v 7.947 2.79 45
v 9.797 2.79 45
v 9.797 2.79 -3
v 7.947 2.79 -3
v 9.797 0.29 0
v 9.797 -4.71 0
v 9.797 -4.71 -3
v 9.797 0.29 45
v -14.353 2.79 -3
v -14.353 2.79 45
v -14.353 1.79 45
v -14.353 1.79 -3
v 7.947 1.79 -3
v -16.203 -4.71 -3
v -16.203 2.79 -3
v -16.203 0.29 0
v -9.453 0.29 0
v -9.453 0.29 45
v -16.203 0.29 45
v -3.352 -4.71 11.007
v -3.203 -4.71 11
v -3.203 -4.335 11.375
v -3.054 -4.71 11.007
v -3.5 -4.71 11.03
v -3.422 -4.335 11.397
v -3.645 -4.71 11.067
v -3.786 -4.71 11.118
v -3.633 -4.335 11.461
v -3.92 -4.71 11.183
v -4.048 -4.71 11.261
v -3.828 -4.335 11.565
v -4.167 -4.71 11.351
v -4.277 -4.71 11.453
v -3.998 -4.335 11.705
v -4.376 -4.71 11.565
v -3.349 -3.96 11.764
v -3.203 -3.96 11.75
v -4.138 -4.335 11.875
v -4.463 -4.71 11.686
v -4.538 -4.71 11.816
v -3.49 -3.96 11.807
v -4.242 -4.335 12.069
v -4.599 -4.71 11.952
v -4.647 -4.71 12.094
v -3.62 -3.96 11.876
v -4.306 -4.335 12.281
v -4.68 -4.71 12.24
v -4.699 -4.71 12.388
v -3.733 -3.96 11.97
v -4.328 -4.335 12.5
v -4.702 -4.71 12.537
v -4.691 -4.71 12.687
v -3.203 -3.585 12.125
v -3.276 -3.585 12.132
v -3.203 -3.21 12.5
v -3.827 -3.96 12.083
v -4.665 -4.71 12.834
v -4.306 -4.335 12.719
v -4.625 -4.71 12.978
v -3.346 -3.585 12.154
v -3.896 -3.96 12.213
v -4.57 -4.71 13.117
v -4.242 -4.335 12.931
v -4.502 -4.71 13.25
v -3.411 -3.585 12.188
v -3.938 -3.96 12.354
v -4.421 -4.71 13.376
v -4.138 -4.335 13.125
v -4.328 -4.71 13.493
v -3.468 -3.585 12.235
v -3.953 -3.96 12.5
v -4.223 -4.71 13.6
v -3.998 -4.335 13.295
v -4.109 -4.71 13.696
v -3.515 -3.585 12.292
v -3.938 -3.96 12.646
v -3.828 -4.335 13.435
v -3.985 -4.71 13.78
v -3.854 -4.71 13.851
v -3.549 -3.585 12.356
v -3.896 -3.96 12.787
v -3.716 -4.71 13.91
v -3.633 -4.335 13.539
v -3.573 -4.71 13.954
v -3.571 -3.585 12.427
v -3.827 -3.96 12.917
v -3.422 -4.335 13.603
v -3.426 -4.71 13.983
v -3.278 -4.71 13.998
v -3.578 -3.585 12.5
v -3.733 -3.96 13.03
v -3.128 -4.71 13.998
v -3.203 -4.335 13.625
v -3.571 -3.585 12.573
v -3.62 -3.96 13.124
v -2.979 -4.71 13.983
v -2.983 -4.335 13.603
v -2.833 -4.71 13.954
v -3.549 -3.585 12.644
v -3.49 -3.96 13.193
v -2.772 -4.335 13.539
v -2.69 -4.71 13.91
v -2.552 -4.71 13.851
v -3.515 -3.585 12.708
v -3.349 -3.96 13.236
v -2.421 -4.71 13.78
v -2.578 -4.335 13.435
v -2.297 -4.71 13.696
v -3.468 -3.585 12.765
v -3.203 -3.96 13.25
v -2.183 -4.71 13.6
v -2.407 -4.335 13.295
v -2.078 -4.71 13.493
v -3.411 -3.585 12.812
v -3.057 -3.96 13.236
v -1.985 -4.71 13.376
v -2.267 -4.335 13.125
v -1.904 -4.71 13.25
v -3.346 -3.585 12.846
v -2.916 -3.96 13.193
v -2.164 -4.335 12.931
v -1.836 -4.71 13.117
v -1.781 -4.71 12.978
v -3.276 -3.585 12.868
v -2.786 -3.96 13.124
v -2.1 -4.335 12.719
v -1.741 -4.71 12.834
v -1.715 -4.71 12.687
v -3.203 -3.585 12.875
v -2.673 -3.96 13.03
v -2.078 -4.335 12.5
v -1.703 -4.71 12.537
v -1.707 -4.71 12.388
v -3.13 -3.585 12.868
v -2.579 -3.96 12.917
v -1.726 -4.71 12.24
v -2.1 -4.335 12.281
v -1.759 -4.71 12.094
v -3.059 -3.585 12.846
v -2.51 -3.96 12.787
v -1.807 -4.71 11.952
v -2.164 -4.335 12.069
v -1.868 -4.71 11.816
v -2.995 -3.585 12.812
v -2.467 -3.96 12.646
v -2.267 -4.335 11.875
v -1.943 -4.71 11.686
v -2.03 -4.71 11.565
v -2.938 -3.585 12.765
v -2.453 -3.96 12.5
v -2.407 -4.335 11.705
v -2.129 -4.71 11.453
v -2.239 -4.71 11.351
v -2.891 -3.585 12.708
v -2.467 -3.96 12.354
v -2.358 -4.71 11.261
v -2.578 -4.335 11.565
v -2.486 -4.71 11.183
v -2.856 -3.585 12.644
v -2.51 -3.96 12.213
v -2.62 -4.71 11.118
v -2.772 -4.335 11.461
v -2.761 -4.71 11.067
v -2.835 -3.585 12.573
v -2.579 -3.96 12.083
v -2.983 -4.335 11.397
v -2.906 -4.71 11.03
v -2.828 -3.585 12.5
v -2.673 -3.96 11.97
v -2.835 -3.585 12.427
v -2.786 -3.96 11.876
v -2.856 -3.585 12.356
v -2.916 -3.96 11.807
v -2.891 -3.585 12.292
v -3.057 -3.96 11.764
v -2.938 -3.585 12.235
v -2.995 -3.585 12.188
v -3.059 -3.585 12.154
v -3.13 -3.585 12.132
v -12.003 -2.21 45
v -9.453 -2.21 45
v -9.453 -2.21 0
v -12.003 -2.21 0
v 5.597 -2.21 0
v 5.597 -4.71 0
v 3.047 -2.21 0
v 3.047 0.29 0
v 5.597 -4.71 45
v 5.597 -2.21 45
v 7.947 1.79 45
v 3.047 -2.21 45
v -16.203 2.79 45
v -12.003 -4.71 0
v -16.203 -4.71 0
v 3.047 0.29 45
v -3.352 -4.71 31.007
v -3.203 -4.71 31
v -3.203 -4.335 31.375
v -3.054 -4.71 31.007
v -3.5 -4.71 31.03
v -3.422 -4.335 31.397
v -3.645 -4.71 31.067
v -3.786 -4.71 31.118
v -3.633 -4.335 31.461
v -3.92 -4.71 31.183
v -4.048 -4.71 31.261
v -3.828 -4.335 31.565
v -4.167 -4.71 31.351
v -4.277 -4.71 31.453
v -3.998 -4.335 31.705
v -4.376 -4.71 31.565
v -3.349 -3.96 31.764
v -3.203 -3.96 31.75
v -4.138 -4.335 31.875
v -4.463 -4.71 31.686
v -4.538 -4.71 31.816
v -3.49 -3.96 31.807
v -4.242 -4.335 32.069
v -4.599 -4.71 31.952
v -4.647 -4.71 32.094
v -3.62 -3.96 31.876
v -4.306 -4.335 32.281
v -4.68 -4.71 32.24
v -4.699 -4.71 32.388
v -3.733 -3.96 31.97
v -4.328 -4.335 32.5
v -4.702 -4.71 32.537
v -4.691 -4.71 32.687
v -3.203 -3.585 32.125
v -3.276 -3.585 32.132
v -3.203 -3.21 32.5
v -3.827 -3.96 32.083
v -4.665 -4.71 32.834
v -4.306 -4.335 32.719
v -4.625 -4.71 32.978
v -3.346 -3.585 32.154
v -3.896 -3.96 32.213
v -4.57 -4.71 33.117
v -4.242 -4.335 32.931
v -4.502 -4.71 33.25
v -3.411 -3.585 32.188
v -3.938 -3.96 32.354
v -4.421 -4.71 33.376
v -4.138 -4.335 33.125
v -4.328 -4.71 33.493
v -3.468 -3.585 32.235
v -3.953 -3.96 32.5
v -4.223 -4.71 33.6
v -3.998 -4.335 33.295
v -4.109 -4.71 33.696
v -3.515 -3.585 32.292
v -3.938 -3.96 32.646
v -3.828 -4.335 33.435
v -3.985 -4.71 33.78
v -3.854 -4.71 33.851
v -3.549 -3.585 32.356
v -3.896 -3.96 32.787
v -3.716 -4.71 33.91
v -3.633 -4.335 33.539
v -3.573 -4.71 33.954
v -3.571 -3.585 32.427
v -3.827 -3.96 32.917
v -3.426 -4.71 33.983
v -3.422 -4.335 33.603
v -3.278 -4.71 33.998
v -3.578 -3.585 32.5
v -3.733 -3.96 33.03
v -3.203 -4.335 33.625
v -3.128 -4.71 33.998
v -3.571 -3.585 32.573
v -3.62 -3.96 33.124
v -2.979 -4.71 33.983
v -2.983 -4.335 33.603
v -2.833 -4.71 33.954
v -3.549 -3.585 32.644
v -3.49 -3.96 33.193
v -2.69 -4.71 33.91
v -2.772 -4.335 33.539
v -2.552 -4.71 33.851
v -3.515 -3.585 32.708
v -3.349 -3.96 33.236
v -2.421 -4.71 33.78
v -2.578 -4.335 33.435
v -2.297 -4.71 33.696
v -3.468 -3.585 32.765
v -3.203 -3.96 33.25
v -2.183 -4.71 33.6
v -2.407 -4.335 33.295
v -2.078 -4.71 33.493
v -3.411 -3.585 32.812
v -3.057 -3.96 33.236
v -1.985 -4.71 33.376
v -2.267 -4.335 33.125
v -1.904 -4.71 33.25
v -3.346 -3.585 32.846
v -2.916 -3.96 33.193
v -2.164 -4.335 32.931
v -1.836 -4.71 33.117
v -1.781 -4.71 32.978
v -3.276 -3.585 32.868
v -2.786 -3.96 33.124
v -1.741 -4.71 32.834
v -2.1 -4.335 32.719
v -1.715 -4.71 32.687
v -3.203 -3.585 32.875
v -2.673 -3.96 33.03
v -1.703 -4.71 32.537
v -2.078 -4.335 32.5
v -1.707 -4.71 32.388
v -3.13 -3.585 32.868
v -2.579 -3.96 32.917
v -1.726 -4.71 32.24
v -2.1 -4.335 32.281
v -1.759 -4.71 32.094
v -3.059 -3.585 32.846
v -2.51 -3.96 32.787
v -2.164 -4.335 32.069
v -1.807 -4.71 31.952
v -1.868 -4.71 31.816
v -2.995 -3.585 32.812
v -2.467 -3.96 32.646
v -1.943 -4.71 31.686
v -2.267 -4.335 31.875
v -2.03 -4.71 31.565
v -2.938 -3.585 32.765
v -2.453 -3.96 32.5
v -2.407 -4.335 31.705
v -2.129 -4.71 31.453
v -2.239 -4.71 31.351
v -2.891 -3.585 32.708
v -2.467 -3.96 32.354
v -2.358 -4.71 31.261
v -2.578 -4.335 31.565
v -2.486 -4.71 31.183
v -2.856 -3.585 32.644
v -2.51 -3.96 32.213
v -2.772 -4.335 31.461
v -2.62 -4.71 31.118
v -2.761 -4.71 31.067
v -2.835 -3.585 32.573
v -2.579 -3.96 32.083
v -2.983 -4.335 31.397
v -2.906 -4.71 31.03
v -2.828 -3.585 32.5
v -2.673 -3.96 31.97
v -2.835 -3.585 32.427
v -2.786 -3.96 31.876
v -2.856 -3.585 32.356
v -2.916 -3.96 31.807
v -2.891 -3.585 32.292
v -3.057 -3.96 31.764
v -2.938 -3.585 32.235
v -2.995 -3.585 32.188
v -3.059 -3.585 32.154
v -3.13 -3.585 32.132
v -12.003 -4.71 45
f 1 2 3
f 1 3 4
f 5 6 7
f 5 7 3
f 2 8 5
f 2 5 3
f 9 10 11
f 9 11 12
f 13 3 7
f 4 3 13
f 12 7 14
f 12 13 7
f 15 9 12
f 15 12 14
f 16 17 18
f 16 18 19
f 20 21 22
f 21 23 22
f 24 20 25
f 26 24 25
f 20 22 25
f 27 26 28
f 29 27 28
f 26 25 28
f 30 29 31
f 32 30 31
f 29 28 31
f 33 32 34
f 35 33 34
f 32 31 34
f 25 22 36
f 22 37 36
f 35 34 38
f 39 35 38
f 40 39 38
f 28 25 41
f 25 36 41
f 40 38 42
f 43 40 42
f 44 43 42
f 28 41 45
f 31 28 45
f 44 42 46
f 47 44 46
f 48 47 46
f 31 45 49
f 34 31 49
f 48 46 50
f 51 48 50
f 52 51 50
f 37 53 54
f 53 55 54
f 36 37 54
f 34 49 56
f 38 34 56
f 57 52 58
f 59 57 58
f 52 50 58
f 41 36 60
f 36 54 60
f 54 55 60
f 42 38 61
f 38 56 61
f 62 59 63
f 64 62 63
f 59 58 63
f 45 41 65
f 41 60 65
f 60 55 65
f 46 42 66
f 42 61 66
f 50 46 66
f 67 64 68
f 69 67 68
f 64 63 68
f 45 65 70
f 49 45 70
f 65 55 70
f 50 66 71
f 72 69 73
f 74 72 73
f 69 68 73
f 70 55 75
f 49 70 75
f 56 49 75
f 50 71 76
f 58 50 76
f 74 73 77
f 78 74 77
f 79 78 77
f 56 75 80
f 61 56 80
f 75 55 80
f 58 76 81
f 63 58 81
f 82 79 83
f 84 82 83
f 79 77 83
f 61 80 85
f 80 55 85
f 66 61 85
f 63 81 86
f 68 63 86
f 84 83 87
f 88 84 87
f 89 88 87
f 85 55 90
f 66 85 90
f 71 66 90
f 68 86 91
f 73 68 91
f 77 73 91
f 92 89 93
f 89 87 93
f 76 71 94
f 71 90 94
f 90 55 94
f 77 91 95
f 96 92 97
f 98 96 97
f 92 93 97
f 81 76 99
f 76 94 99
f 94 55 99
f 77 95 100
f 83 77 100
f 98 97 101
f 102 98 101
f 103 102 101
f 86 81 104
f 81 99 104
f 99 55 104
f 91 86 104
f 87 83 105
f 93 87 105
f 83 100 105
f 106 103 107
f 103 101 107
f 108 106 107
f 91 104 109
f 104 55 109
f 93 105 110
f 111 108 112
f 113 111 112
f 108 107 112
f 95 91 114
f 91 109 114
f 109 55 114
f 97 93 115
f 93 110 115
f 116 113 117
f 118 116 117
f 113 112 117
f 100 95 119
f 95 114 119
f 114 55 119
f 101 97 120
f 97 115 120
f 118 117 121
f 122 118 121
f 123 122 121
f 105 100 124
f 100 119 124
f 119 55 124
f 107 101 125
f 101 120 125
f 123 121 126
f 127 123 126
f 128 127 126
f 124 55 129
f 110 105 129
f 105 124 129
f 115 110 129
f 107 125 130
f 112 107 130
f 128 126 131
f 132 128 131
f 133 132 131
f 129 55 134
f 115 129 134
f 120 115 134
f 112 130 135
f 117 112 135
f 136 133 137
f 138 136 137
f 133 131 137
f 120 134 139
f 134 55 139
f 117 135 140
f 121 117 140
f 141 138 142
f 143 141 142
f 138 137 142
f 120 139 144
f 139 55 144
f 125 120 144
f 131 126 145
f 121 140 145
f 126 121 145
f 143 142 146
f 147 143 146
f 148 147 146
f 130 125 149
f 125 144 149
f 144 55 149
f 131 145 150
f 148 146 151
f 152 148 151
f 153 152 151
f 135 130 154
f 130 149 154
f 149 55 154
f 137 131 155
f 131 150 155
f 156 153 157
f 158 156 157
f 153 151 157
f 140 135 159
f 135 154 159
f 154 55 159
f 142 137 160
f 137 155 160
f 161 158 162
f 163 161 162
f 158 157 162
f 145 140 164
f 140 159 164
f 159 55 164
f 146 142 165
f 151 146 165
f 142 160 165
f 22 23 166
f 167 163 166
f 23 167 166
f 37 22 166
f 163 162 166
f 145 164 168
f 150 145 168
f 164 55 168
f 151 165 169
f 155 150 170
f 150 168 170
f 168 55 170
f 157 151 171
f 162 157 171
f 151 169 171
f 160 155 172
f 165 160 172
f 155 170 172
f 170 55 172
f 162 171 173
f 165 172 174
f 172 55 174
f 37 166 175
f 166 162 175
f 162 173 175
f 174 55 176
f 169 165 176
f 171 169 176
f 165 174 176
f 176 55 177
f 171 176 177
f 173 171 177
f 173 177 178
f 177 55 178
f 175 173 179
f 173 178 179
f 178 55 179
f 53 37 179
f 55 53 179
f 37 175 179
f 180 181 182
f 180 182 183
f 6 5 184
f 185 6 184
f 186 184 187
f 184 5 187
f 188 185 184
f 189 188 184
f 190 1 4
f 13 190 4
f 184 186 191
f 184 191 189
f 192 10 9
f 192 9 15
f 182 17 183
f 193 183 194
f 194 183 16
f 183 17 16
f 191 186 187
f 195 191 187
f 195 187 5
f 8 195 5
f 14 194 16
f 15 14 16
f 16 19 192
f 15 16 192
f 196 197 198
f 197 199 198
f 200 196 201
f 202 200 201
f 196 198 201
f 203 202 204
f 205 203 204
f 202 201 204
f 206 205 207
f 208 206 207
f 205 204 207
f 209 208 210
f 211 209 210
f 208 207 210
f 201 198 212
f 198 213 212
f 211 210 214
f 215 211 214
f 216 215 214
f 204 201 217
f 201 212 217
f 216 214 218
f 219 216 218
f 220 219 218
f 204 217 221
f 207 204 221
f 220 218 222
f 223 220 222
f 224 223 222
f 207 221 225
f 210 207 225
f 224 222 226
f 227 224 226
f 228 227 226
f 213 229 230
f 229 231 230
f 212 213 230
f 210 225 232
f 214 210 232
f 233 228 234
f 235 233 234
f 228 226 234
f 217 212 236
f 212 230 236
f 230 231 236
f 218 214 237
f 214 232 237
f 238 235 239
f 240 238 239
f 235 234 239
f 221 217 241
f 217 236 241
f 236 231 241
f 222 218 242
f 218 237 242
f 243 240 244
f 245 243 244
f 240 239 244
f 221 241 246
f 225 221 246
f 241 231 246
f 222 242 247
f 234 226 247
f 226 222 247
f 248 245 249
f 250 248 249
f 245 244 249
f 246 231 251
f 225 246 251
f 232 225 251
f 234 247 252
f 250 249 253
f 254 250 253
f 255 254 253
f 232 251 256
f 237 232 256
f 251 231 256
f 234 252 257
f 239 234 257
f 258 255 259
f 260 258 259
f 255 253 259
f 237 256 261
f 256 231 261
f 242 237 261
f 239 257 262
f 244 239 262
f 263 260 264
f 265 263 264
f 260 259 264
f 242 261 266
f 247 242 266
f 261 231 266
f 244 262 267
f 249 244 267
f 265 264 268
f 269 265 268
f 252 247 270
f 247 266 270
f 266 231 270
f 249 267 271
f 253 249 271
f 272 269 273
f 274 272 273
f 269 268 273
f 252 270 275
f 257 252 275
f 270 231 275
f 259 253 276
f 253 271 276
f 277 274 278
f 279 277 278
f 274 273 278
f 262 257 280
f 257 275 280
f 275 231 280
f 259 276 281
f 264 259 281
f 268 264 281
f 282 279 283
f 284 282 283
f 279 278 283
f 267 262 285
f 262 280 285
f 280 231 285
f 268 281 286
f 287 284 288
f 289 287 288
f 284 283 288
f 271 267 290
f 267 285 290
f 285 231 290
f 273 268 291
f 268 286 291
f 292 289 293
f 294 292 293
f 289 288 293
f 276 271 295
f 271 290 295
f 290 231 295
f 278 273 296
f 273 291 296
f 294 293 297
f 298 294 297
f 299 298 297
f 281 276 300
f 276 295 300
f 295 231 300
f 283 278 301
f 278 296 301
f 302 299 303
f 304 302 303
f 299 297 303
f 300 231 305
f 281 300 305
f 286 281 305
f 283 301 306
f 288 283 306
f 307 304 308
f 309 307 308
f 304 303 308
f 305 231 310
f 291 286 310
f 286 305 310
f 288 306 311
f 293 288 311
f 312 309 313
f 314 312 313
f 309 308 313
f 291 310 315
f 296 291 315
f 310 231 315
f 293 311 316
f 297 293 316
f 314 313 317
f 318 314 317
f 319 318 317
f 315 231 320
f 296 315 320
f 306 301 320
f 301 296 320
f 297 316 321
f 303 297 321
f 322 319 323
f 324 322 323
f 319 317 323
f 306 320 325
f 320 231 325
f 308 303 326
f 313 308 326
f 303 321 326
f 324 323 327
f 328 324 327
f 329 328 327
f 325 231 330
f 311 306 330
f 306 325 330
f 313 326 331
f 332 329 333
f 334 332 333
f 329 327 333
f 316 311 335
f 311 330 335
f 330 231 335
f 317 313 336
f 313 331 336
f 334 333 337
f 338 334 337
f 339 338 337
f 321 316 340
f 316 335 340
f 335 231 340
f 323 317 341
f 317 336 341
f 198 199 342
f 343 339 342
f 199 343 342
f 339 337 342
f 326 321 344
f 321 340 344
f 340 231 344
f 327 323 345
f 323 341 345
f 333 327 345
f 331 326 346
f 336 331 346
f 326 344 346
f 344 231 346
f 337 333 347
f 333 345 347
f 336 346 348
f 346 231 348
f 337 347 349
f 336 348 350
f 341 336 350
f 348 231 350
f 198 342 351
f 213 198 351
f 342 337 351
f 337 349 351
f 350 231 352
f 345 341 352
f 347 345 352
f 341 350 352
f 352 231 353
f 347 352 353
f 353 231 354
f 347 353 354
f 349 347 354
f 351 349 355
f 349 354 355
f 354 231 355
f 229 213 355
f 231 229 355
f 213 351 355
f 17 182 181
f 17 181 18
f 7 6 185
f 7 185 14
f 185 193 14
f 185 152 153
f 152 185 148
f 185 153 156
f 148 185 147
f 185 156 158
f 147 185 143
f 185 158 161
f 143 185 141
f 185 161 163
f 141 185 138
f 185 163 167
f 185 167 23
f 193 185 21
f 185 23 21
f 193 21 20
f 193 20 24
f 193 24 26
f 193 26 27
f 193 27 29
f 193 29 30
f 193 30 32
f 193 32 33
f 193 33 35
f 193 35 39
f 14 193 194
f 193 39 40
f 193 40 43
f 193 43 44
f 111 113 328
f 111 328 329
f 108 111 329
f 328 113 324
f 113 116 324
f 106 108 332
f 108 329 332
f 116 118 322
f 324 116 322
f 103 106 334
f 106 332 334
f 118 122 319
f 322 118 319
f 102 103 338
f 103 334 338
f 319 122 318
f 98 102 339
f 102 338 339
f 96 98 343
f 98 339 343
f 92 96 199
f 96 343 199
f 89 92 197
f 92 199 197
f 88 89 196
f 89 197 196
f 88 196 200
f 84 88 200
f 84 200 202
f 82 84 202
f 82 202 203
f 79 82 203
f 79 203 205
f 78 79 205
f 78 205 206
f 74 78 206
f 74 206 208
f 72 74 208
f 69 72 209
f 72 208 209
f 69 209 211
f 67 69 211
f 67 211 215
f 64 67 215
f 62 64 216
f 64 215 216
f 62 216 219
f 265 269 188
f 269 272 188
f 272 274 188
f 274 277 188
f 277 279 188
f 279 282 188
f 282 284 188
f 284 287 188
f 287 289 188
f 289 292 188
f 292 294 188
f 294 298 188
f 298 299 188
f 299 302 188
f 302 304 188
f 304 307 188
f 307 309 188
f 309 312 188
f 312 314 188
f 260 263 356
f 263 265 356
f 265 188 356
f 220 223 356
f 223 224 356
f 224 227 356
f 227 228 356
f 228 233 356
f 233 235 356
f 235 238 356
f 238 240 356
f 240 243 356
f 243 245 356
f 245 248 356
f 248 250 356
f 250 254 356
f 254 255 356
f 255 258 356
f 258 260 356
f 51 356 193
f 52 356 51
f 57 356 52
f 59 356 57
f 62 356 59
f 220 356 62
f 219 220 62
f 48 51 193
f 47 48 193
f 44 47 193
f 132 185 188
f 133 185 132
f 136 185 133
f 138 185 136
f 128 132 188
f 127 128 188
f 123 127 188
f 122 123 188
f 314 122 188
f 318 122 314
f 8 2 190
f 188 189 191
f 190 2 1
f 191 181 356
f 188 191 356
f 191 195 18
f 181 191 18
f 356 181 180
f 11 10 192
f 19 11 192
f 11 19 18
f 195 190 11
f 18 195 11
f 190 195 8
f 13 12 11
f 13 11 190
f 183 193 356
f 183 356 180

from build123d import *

# Parameters (mm, degrees)
SKETCH1_W           = 6.25
SKETCH1_H           = 2.5
SKETCH1_W_2         = 8.8
BOSS_EXTRUDE1_DEPTH = 45
SKETCH9_W           = 26
SKETCH9_H           = 7.5
BOSS_EXTRUDE3_DEPTH = 3
SKETCH10_W          = 11.15
SKETCH10_H          = 48
CUT_EXTRUDE3_DEPTH  = 1


with BuildPart() as part:
    # Sketch1 → Boss-Extrude1 (new body)
    with BuildSketch(Plane.XY):
        Polygon((-3.202898551, 2.789855072), (-3.202898551, 0.289855072), (3.047101449, 0.289855072), (9.797101449, 0.289855072), (9.797101449, 2.789855072), align=None)
        with Locations((-0.077898551, -0.960144928)):
            Rectangle(SKETCH1_W, SKETCH1_H)
        with Locations((1.197101449, -3.460144928)):
            Rectangle(SKETCH1_W_2, SKETCH1_H)
    boss_extrude1 = extrude(amount=BOSS_EXTRUDE1_DEPTH)

    # Mirror1: Boss-Extrude1 across plane
    add(boss_extrude1.mirror(Plane(origin=(-3.202898551, 0, 45), x_dir=(0, 0, 1), z_dir=(-1, 0, 0))))

    # Cut-Extrude2 cone 1 section (through the dimple's axis) → Cut-Extrude2 (revolve, cut)
    with BuildSketch(Plane(origin=(-3.202898551, -4.710144928, 32.5), x_dir=(0, 0, -1), z_dir=(1, 0, 0))):
        Polygon((0, 0), (1.5, 0), (0, 1.5), align=None)
    revolve(axis=Axis((-3.202898551, -4.710144928, 32.5), (0, 1, 0)), mode=Mode.SUBTRACT)

    # Cut-Extrude2 cone 2 section (through the dimple's axis) → Cut-Extrude2 cone 2 (revolve, cut)
    with BuildSketch(Plane(origin=(-3.202898551, -4.710144928, 12.5), x_dir=(0, 0, -1), z_dir=(1, 0, 0))):
        Polygon((0, 0), (1.5, 0), (0, 1.5), align=None)
    revolve(axis=Axis((-3.202898551, -4.710144928, 12.5), (0, 1, 0)), mode=Mode.SUBTRACT)

    # Sketch9 → Boss-Extrude3 (add)
    with BuildSketch(Plane(origin=(0, 0, 0), x_dir=(-1, 0, 0), z_dir=(0, 0, -1))):
        with Locations((3.202898551, -0.960144928)):
            Rectangle(SKETCH9_W, SKETCH9_H)
    extrude(amount=BOSS_EXTRUDE3_DEPTH)

    # Sketch10 → Cut-Extrude3 (cut)
    with BuildSketch(Plane(origin=(0, 2.789855072, 0), x_dir=(1, 0, 0), z_dir=(0, 1, 0))):
        with Locations((-8.777898551, -21)):
            Rectangle(SKETCH10_W, SKETCH10_H)
        with Locations((2.372101449, -21)):
            Rectangle(SKETCH10_W, SKETCH10_H)
    extrude(amount=-CUT_EXTRUDE3_DEPTH, mode=Mode.SUBTRACT)


solid = part.part
